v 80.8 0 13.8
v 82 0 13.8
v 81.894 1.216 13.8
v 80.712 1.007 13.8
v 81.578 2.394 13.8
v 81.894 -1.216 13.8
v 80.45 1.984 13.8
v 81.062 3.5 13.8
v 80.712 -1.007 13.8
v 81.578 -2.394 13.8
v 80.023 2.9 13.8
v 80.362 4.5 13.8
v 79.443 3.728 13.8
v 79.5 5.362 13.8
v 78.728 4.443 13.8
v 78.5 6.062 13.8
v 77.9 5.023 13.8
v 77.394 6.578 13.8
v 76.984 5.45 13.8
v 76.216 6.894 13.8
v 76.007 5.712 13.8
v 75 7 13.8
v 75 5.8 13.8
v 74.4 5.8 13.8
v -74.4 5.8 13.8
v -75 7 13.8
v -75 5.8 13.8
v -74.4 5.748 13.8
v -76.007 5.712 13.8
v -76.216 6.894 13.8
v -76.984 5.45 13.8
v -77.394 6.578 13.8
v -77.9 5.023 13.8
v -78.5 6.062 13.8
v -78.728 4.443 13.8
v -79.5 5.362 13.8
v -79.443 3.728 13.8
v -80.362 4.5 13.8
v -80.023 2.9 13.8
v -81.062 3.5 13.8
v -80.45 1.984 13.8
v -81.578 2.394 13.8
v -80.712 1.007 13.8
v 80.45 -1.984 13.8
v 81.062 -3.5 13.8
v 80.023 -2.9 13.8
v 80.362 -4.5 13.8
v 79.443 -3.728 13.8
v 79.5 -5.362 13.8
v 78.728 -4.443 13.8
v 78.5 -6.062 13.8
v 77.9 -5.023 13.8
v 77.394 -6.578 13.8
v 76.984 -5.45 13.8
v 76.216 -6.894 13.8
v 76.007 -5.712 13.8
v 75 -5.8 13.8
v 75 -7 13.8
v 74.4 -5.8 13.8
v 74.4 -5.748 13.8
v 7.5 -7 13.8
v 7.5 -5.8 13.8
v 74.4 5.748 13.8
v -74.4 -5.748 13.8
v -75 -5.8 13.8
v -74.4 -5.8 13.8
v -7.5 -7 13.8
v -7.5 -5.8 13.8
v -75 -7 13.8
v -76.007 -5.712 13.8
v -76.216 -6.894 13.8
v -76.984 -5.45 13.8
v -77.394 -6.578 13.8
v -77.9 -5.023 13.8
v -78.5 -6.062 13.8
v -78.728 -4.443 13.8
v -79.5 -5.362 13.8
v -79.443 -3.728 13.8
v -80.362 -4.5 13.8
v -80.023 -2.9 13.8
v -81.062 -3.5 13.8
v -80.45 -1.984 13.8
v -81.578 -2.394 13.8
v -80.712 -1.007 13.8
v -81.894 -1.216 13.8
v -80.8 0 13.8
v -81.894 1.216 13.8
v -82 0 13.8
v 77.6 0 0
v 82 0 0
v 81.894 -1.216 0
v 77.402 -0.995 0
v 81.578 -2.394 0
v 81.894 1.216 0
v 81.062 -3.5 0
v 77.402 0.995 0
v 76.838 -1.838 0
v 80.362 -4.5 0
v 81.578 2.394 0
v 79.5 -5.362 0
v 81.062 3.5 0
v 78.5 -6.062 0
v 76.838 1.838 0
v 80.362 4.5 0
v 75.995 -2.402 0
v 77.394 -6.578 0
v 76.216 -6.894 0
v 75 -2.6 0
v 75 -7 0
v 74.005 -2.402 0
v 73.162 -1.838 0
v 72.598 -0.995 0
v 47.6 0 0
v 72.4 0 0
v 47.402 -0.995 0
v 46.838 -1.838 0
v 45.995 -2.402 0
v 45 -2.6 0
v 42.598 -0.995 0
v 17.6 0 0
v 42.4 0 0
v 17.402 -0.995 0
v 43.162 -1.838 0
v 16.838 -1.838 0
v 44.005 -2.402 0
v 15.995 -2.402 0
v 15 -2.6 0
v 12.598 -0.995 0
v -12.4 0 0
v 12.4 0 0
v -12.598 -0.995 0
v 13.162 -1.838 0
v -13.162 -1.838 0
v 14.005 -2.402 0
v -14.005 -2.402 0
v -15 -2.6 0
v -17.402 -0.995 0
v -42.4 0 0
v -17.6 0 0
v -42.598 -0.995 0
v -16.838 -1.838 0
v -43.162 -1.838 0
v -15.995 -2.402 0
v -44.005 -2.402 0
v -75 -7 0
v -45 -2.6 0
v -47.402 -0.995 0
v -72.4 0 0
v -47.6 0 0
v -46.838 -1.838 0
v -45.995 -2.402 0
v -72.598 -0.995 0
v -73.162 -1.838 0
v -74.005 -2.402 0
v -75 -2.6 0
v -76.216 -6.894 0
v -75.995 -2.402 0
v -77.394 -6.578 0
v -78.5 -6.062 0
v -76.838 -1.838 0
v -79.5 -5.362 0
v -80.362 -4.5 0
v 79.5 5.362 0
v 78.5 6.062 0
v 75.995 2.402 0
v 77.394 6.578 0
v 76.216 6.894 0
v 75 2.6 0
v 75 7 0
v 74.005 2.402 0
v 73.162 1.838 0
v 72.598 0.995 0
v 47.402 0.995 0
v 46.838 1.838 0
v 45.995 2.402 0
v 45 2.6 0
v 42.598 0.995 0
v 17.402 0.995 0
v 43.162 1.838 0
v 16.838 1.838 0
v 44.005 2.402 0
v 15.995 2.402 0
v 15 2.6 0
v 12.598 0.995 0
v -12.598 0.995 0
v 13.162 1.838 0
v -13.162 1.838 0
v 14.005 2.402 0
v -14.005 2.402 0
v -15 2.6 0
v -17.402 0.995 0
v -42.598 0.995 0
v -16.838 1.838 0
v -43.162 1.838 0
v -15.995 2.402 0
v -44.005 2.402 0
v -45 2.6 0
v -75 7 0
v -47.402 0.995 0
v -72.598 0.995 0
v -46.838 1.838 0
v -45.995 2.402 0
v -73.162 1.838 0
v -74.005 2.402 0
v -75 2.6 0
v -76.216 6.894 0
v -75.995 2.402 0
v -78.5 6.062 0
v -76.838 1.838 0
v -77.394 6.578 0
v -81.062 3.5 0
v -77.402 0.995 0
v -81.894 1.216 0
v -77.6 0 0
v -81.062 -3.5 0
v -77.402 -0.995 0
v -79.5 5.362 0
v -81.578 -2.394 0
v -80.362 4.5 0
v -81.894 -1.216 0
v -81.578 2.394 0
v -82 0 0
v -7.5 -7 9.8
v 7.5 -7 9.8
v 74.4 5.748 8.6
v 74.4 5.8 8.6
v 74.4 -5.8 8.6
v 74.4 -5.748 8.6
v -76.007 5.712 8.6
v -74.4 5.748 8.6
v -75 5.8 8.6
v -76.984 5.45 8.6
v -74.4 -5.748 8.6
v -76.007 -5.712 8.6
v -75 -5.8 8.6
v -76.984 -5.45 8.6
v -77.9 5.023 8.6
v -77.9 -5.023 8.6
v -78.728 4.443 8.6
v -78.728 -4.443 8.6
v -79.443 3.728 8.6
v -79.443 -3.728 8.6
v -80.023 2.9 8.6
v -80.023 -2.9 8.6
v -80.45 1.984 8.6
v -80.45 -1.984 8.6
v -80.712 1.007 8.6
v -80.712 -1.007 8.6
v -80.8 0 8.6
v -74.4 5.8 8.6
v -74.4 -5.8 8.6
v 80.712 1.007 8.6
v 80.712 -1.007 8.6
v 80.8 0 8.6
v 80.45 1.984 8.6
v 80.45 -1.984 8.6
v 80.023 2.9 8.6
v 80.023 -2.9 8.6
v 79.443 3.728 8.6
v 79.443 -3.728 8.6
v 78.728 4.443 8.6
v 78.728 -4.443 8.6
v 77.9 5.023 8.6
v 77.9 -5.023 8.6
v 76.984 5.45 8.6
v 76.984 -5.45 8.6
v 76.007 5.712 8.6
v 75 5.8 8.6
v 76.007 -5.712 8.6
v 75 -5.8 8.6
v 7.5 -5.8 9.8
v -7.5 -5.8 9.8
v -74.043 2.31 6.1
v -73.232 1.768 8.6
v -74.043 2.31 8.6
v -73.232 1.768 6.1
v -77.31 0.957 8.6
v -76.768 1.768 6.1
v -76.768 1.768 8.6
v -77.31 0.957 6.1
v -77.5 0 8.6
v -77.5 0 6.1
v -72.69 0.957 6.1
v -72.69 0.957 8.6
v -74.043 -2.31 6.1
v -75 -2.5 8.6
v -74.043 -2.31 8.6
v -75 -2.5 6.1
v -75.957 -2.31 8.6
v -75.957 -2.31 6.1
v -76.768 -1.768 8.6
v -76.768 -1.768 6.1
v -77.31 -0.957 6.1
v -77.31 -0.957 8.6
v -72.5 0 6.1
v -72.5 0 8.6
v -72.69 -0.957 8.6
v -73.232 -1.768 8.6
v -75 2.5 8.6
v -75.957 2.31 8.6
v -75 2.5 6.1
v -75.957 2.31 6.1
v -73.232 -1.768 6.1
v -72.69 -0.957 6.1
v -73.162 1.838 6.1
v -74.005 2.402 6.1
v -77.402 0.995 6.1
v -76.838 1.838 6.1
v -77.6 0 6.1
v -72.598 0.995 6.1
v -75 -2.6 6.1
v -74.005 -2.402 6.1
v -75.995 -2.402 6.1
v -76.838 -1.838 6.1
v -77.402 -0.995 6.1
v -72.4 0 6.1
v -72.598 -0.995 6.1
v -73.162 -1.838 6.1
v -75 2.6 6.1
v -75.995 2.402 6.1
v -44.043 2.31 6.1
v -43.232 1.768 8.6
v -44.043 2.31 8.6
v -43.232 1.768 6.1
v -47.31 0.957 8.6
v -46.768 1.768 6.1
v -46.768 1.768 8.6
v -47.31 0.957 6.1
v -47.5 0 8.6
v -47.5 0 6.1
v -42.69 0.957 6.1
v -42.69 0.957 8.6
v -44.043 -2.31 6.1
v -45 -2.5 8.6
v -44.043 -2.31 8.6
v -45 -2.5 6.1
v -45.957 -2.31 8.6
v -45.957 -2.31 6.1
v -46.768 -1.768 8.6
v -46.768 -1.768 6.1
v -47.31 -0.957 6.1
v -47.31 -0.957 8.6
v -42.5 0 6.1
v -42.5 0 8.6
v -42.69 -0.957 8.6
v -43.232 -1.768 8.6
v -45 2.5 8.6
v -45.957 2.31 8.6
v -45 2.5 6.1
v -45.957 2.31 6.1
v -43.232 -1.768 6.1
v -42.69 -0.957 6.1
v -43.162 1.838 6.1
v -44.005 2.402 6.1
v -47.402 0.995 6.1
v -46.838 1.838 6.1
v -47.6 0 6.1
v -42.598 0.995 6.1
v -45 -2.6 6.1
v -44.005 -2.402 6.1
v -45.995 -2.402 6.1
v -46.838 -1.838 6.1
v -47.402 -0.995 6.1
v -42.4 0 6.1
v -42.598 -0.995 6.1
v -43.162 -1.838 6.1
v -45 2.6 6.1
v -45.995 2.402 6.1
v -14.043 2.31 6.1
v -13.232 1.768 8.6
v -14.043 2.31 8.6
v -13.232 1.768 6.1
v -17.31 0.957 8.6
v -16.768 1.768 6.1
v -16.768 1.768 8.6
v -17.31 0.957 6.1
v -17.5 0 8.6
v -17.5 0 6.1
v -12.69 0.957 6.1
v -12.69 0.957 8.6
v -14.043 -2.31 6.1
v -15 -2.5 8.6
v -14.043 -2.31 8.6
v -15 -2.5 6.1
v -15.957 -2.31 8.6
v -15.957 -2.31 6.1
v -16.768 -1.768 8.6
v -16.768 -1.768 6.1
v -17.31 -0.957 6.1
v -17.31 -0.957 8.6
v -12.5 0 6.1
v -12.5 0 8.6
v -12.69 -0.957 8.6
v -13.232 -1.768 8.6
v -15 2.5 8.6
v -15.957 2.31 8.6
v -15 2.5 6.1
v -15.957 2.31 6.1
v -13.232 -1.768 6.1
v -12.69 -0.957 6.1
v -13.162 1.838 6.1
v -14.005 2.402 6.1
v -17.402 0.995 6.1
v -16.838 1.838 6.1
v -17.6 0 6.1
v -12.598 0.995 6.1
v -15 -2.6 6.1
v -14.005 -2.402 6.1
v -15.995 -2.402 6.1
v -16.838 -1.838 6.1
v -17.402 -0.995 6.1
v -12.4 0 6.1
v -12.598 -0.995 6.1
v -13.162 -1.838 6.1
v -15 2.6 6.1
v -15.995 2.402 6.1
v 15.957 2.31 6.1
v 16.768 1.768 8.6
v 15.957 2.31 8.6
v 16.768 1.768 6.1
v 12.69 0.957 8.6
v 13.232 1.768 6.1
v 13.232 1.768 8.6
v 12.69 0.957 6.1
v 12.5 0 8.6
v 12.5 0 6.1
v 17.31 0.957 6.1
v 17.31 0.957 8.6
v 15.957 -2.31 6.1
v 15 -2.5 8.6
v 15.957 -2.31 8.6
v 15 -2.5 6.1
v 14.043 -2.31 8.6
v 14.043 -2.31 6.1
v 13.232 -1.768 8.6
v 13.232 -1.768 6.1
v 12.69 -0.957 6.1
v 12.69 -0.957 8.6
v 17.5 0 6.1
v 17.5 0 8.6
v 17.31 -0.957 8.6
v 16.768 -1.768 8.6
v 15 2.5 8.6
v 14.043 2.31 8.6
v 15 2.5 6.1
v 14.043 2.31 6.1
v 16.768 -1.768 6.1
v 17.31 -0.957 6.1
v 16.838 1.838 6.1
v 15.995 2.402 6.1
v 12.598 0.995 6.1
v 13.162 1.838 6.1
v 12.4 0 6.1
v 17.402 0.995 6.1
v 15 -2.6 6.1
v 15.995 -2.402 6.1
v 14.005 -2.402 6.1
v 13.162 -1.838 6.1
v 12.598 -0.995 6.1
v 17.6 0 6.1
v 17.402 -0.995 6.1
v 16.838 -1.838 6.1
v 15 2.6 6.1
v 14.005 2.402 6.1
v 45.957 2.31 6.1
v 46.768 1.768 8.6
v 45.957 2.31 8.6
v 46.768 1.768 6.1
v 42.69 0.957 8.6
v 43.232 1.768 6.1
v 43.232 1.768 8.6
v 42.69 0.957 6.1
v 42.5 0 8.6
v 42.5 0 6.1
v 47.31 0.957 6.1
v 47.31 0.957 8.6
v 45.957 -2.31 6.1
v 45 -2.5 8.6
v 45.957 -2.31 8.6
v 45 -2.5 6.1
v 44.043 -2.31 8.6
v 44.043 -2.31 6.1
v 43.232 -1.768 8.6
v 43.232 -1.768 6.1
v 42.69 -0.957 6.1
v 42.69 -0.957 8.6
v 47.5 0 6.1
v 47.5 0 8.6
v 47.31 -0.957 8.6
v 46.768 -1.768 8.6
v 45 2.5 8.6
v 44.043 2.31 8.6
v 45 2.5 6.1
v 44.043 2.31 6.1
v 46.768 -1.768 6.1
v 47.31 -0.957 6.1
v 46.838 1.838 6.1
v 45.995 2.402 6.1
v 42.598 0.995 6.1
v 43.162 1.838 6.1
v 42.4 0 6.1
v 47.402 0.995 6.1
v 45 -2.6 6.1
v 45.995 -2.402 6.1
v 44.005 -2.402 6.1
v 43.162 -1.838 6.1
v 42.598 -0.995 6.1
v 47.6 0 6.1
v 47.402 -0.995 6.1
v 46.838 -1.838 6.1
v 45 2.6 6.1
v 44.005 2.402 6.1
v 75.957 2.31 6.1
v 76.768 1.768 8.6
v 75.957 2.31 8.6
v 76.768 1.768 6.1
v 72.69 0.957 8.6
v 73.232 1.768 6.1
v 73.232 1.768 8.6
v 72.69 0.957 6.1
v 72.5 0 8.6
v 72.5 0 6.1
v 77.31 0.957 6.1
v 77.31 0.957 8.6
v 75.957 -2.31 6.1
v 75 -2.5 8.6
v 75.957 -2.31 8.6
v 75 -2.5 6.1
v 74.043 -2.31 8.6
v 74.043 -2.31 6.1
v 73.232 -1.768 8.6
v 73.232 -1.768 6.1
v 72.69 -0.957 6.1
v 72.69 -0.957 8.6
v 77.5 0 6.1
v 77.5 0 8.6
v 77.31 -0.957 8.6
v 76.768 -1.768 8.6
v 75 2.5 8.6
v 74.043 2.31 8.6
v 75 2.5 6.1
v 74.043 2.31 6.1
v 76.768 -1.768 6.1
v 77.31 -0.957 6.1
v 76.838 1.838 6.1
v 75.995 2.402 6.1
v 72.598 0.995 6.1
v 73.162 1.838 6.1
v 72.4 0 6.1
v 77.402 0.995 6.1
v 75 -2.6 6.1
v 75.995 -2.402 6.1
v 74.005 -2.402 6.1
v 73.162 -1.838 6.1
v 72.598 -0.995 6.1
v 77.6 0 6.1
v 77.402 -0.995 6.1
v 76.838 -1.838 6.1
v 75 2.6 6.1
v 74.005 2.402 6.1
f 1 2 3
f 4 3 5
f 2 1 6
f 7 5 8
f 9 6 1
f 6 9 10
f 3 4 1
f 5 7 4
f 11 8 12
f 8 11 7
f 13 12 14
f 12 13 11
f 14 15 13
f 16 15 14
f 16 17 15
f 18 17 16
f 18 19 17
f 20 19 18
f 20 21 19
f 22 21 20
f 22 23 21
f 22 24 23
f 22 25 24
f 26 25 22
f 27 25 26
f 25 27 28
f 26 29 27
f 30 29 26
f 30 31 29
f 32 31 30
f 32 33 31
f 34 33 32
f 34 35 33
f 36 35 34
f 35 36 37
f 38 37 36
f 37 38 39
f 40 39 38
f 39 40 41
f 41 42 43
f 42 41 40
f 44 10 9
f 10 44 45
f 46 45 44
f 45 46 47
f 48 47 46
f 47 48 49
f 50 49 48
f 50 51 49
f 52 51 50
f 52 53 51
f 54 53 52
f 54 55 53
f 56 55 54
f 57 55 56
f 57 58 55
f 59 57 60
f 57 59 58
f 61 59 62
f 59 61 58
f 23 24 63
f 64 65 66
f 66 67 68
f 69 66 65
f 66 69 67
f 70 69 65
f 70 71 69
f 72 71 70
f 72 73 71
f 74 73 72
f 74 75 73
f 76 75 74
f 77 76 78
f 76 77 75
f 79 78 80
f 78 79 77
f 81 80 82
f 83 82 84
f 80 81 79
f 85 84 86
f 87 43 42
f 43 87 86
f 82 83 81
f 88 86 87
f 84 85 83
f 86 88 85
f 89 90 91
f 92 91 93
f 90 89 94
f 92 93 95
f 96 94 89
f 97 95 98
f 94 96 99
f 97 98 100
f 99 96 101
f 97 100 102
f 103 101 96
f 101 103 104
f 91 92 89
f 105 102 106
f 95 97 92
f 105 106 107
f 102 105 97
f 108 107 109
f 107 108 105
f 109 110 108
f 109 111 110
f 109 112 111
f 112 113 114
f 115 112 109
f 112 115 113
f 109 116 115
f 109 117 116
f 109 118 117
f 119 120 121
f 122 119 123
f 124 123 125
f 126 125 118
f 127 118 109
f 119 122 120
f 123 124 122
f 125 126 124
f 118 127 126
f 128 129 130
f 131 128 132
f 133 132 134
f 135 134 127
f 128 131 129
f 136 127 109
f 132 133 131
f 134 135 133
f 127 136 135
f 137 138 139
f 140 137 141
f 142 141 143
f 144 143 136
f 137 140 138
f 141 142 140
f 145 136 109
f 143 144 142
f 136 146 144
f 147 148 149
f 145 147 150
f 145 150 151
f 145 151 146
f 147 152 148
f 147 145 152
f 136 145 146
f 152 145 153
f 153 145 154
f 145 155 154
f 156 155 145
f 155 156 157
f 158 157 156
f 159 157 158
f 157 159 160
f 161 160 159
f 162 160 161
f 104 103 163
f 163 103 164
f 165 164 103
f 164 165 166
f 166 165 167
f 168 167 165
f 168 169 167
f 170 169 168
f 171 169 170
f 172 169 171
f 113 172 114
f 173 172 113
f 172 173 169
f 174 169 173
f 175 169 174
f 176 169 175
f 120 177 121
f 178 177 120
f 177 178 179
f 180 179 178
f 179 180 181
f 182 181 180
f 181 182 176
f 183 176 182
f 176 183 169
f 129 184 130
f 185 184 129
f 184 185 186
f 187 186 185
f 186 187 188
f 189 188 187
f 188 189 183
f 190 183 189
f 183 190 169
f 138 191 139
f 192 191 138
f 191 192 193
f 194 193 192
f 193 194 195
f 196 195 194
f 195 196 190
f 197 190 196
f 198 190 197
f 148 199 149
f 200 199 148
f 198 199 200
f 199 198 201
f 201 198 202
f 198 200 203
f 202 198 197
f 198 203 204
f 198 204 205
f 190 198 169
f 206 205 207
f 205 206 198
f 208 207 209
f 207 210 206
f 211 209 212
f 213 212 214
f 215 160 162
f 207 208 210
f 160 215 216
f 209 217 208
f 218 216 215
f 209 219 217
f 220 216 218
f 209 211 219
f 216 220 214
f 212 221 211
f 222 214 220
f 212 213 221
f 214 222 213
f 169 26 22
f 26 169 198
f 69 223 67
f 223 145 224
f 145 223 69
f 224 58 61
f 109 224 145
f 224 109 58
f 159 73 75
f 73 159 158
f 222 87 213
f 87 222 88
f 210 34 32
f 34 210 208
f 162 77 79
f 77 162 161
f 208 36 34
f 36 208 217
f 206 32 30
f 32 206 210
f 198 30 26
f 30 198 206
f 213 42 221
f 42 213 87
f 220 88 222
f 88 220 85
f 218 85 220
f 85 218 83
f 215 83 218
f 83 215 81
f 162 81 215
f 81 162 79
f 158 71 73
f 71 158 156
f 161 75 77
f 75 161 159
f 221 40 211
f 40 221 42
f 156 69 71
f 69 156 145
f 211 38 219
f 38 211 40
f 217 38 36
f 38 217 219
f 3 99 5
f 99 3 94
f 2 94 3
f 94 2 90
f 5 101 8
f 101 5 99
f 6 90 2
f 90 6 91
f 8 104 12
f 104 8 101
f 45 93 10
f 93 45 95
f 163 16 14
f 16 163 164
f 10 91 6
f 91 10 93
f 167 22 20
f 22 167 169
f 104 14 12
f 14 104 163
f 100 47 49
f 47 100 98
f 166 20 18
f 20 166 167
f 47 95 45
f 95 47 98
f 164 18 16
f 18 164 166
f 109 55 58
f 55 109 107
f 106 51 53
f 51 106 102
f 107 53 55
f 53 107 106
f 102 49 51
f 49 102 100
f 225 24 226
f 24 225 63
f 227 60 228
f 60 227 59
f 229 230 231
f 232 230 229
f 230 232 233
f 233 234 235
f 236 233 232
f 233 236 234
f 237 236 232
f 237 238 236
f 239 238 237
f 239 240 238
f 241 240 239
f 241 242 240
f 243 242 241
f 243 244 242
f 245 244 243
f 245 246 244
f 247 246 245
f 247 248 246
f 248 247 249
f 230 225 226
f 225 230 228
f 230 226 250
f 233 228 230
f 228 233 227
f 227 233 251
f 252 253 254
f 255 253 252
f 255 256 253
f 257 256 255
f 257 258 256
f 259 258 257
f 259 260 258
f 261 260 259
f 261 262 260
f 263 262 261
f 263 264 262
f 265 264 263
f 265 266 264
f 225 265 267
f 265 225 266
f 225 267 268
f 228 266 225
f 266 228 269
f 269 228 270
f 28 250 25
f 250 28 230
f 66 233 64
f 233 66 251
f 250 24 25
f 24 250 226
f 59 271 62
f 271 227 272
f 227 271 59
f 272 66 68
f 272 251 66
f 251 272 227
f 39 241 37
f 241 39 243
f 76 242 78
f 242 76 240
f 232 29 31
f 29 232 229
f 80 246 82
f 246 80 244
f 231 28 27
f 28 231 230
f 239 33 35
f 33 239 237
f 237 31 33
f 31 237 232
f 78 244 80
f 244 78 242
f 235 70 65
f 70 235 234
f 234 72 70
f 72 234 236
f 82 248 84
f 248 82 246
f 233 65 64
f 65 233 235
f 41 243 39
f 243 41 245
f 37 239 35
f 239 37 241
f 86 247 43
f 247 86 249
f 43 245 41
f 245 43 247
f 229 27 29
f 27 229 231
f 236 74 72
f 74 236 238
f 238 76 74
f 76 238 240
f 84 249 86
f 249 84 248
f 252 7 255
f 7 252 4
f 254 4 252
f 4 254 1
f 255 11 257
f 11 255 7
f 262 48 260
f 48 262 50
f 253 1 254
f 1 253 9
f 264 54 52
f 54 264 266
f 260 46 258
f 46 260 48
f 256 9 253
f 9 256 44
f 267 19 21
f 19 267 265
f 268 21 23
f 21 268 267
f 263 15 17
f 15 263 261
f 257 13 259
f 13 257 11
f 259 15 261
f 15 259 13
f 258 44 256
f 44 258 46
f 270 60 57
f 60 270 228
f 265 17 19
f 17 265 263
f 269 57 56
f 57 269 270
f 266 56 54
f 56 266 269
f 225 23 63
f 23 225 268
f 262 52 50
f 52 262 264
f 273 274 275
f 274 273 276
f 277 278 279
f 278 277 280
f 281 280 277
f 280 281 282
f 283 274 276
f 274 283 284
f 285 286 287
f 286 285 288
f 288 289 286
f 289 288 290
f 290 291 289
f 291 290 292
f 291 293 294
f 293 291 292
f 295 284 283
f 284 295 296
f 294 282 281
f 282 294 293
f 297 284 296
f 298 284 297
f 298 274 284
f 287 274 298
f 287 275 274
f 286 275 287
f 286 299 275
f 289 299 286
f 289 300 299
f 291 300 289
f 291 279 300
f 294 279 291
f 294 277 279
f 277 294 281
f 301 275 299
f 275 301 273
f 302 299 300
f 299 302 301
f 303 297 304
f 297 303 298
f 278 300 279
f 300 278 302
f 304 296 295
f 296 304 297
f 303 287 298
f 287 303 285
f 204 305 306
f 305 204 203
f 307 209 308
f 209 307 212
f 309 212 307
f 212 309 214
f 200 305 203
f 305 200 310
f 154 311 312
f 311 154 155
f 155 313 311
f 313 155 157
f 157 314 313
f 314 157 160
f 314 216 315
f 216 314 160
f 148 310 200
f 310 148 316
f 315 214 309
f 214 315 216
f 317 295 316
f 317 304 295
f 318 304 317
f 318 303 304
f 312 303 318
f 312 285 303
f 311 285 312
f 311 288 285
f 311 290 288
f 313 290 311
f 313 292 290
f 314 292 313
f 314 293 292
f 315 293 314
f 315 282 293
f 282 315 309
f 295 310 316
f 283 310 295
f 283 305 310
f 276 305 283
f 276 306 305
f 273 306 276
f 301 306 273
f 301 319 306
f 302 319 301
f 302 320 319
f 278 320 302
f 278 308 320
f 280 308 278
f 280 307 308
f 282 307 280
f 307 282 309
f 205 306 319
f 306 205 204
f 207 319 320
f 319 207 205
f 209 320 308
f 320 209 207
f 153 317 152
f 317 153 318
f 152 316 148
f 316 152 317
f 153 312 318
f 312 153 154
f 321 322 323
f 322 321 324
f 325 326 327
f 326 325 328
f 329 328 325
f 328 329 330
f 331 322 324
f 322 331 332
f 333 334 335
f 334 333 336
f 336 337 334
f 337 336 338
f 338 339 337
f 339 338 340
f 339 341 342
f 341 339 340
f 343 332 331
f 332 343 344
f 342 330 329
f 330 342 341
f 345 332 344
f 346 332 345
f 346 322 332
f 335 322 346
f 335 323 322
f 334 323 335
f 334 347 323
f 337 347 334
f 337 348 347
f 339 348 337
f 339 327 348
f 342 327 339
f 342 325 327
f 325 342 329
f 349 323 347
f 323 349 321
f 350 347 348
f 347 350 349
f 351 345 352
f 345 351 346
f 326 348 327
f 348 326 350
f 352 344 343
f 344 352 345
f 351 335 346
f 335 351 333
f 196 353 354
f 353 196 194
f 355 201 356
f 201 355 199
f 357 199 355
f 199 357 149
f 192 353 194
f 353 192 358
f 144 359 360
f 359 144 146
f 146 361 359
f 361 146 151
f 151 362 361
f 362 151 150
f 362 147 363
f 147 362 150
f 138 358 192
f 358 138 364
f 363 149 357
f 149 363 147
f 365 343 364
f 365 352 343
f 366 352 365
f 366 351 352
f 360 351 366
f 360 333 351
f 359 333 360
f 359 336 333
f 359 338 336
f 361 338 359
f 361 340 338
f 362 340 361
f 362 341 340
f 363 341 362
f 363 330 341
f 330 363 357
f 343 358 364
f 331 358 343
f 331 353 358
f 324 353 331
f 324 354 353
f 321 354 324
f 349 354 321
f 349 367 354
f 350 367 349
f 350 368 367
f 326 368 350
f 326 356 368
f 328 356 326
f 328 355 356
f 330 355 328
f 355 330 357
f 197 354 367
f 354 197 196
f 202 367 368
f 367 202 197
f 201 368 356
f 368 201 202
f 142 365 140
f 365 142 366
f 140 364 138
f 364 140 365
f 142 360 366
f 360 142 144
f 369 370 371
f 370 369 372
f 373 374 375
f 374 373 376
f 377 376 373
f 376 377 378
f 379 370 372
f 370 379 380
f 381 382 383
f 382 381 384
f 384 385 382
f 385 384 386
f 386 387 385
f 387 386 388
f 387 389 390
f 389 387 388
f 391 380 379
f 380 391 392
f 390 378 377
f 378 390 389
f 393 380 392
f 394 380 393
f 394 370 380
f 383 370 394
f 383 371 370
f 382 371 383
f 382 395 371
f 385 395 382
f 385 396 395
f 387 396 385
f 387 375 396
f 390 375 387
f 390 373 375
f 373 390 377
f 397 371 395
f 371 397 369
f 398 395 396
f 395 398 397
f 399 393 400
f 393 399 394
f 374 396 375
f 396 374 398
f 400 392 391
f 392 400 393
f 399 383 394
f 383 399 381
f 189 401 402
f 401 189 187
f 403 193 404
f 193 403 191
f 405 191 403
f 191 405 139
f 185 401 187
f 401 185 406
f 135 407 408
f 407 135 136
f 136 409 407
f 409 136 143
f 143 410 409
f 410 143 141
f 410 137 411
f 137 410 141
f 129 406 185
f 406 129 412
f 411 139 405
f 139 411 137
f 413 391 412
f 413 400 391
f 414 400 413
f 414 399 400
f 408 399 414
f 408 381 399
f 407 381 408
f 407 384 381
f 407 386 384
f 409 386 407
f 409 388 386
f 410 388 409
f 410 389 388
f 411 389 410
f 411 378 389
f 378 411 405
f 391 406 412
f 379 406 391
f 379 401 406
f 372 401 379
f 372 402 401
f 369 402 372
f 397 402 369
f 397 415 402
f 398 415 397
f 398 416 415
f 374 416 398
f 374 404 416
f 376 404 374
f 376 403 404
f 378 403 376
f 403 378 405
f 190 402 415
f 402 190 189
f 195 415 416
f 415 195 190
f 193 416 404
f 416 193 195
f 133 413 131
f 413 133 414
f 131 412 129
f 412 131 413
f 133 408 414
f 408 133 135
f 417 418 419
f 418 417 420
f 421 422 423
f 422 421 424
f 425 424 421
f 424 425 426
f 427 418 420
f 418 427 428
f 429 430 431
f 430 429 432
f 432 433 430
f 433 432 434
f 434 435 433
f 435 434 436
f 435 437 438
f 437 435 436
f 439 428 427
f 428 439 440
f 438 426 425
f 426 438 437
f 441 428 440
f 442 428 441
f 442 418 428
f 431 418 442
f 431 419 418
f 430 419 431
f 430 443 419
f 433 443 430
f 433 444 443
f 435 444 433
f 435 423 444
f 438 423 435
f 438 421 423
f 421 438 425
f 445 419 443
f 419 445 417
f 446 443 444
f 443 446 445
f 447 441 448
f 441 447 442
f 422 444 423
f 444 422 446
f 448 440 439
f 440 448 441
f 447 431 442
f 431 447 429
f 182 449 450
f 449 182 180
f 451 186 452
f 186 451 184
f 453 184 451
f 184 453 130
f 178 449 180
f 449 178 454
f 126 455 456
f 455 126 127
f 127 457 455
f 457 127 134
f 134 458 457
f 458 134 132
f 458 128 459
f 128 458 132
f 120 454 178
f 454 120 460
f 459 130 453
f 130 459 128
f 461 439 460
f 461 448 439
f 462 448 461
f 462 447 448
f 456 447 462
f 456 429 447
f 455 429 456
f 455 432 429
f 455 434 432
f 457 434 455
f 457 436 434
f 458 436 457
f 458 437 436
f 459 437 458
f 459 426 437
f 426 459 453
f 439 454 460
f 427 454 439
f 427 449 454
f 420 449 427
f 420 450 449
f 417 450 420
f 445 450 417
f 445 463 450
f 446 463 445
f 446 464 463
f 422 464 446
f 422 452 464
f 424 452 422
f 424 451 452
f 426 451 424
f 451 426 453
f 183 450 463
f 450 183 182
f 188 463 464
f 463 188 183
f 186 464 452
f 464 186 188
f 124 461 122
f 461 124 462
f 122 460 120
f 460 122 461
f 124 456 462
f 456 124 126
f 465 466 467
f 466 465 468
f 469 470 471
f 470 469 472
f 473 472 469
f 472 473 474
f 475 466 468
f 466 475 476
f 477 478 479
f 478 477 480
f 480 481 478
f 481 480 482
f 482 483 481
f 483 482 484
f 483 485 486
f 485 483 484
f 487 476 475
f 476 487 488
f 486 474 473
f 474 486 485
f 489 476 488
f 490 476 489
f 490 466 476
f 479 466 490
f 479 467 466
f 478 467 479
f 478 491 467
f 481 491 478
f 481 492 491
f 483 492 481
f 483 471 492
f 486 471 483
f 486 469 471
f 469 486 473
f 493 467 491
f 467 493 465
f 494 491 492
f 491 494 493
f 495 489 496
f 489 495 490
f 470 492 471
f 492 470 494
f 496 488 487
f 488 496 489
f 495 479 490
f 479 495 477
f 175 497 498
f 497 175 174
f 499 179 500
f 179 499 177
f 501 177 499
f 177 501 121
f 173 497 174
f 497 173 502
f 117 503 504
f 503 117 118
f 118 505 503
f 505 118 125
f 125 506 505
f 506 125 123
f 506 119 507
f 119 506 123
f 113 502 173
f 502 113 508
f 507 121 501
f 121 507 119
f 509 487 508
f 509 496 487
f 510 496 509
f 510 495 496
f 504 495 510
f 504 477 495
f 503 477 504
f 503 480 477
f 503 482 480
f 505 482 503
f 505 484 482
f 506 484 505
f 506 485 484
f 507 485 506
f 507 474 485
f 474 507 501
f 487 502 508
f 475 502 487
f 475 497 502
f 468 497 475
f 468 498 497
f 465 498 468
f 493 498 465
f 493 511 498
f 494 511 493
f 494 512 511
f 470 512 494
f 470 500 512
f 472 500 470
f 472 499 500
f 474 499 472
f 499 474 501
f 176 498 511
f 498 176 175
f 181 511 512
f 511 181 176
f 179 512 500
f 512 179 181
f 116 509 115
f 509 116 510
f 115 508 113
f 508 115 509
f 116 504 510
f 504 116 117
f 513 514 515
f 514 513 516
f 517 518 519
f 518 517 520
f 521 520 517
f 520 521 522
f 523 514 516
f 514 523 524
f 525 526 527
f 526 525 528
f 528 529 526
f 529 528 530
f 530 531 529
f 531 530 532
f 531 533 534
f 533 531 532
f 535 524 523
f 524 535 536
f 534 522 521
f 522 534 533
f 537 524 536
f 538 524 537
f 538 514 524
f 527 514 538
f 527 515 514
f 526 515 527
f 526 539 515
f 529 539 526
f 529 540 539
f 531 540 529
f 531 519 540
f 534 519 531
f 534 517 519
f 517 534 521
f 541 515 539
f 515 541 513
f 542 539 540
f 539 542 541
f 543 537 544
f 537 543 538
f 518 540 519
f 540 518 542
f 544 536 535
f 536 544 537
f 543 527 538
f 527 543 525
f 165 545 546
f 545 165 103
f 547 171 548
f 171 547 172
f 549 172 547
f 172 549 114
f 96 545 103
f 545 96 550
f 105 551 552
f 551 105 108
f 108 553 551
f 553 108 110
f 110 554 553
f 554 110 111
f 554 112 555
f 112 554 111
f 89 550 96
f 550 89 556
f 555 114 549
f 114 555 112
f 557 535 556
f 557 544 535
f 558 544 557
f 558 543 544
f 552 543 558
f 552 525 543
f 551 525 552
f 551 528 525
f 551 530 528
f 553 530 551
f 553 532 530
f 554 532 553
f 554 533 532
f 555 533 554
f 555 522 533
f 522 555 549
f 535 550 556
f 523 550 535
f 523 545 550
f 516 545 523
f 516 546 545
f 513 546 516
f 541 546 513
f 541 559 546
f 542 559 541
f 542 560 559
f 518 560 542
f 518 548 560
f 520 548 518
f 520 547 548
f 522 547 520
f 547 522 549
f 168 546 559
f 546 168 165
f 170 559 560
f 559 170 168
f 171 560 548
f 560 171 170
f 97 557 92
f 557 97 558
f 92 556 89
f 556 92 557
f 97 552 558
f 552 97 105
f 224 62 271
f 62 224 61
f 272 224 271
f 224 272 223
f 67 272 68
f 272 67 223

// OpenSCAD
// Hoverlay II power connector
// created by Moritz Walter, 2014
// licensed under GPL V3
// all infos at iamnotachoice.com/hoverlay-2

hole_dist=30;
hole_dia=3;

outer_dia=14;
walls=1.2;
inner_dia=outer_dia-2*walls;
inner_height=12.6;
cutout_height=4;
cutout_width=15;


plug_bottom_radius=5.0/2; // must: 4.7/2 is 4.2/2
plug_bottom_height=5;
plug_total_height=12;
plug_top_height=plug_total_height-plug_bottom_height;
plug_top_radius=5.2/2; // must: 4.2/2  is: 3.9/2
plug_dive_length=17.2/2;

slate_height=3;
slate_side=10;

connector_distance=30;

cable_shoe_height=0.8;
cable_shoe_radius=7.2/2;

holder_mount_radius=17.5/2; // max. 17.5
holder_body_radius=9.5/2; // max. 17.5
holder_mount_height=2;
holder_body_height=plug_dive_length-slate_height;
holder_screw_radius=4/2;

holder_screw_radius=1.5/2;
holder_screw_offset=1.7;

contact_screw1_offset=5;
contact_screw2_offset=7;
contact_screw_radius=3/2;
contact_plate_height=10;
contact_plate_thickness=holder_body_radius;
contact_plate_depth=holder_body_radius;
contact_plate_width=8.84;
contact_plate_offset=0;
contact_plate_radius=7.5;
contact_plate_fn=6;

drill_hole_radius=2/2;
drill_hole_offset=6.5;

holder_total_height=holder_body_height+contact_plate_height;



module plug(){
	// plug bottom
	translate([0,0,-plug_dive_length+plug_bottom_height/2])
		cylinder(r=plug_bottom_radius,h=plug_bottom_height,center=true, $fn=16);
	// plug top
	translate([0,0,-plug_dive_length+(plug_bottom_height+plug_top_height)/2])
		cylinder(r=plug_top_radius,h=plug_top_height,center=true, $fn=16);
}

module holder(){
	difference(){
		// holder body
		translate([0,0,-slate_height-holder_body_height/2])
			cylinder(r=holder_body_radius,h=holder_body_height,center=true);
			
		plug();
	}
}

module holder_printable(){
rotate([0,180,0])
	translate([0,0,slate_height])
		holder();
}

module outer_case(){
	translate([0,0,(inner_height+walls)/2])
		cube([5*hole_dist,outer_dia,inner_height+walls],center=true);
	translate([-2.5*hole_dist,0,(inner_height+walls)/2])
		cylinder(r=outer_dia/2, h=inner_height+walls, center=true,$fn=36);
	translate([2.5*hole_dist,0,(inner_height+walls)/2])
		cylinder(r=outer_dia/2, h=inner_height+walls, center=true,$fn=36);
}

module inner_case(){
		translate([0,0,(inner_height+walls)/2+8]){
			cube([5*hole_dist-walls,inner_dia,inner_height],center=true);
			translate([-2.5*hole_dist,0,0])
				cylinder(r=inner_dia/2, h=inner_height, center=true,$fn=36);
			translate([2.5*hole_dist,0,0])
				cylinder(r=inner_dia/2, h=inner_height, center=true,$fn=36);
	}
}

module cutout(){
	translate([0,-(outer_dia-walls)/2,-cutout_height/2+inner_height+walls]){
		cube([cutout_width,walls,cutout_height],center=true);
	}
}

module top(){
	union(){
		translate([0,0,walls/2]){
			cube([5*hole_dist-walls,outer_dia,walls],center=true);
			translate([-2.5*hole_dist,0,0])
				cylinder(r=outer_dia/2, h=walls, center=true,$fn=36);
			translate([2.5*hole_dist,0,0])
				cylinder(r=outer_dia/2, h=walls, center=true,$fn=36);
		}
		translate([0,0,walls+walls/2]){
			cube([5*hole_dist-walls,inner_dia,walls],center=true);
			translate([-2.5*hole_dist,0,0])
				cylinder(r=inner_dia/2, h=walls, center=true,$fn=36);
			translate([2.5*hole_dist,0,0])
				cylinder(r=inner_dia/2, h=walls, center=true,$fn=36);
		}
		translate([0,-(outer_dia-walls)/2,walls/2+walls/2]){
			cube([cutout_width,walls,walls+walls],center=true);
		}
	}
}

module case(){
	difference(){
		outer_case();
		inner_case();
		cutout();
		for(i=[-2.5:1:2.5])
		translate([i*hole_dist,0,0])
			rotate([0,180,0])
					plug();
	}
}

//top();
case();
